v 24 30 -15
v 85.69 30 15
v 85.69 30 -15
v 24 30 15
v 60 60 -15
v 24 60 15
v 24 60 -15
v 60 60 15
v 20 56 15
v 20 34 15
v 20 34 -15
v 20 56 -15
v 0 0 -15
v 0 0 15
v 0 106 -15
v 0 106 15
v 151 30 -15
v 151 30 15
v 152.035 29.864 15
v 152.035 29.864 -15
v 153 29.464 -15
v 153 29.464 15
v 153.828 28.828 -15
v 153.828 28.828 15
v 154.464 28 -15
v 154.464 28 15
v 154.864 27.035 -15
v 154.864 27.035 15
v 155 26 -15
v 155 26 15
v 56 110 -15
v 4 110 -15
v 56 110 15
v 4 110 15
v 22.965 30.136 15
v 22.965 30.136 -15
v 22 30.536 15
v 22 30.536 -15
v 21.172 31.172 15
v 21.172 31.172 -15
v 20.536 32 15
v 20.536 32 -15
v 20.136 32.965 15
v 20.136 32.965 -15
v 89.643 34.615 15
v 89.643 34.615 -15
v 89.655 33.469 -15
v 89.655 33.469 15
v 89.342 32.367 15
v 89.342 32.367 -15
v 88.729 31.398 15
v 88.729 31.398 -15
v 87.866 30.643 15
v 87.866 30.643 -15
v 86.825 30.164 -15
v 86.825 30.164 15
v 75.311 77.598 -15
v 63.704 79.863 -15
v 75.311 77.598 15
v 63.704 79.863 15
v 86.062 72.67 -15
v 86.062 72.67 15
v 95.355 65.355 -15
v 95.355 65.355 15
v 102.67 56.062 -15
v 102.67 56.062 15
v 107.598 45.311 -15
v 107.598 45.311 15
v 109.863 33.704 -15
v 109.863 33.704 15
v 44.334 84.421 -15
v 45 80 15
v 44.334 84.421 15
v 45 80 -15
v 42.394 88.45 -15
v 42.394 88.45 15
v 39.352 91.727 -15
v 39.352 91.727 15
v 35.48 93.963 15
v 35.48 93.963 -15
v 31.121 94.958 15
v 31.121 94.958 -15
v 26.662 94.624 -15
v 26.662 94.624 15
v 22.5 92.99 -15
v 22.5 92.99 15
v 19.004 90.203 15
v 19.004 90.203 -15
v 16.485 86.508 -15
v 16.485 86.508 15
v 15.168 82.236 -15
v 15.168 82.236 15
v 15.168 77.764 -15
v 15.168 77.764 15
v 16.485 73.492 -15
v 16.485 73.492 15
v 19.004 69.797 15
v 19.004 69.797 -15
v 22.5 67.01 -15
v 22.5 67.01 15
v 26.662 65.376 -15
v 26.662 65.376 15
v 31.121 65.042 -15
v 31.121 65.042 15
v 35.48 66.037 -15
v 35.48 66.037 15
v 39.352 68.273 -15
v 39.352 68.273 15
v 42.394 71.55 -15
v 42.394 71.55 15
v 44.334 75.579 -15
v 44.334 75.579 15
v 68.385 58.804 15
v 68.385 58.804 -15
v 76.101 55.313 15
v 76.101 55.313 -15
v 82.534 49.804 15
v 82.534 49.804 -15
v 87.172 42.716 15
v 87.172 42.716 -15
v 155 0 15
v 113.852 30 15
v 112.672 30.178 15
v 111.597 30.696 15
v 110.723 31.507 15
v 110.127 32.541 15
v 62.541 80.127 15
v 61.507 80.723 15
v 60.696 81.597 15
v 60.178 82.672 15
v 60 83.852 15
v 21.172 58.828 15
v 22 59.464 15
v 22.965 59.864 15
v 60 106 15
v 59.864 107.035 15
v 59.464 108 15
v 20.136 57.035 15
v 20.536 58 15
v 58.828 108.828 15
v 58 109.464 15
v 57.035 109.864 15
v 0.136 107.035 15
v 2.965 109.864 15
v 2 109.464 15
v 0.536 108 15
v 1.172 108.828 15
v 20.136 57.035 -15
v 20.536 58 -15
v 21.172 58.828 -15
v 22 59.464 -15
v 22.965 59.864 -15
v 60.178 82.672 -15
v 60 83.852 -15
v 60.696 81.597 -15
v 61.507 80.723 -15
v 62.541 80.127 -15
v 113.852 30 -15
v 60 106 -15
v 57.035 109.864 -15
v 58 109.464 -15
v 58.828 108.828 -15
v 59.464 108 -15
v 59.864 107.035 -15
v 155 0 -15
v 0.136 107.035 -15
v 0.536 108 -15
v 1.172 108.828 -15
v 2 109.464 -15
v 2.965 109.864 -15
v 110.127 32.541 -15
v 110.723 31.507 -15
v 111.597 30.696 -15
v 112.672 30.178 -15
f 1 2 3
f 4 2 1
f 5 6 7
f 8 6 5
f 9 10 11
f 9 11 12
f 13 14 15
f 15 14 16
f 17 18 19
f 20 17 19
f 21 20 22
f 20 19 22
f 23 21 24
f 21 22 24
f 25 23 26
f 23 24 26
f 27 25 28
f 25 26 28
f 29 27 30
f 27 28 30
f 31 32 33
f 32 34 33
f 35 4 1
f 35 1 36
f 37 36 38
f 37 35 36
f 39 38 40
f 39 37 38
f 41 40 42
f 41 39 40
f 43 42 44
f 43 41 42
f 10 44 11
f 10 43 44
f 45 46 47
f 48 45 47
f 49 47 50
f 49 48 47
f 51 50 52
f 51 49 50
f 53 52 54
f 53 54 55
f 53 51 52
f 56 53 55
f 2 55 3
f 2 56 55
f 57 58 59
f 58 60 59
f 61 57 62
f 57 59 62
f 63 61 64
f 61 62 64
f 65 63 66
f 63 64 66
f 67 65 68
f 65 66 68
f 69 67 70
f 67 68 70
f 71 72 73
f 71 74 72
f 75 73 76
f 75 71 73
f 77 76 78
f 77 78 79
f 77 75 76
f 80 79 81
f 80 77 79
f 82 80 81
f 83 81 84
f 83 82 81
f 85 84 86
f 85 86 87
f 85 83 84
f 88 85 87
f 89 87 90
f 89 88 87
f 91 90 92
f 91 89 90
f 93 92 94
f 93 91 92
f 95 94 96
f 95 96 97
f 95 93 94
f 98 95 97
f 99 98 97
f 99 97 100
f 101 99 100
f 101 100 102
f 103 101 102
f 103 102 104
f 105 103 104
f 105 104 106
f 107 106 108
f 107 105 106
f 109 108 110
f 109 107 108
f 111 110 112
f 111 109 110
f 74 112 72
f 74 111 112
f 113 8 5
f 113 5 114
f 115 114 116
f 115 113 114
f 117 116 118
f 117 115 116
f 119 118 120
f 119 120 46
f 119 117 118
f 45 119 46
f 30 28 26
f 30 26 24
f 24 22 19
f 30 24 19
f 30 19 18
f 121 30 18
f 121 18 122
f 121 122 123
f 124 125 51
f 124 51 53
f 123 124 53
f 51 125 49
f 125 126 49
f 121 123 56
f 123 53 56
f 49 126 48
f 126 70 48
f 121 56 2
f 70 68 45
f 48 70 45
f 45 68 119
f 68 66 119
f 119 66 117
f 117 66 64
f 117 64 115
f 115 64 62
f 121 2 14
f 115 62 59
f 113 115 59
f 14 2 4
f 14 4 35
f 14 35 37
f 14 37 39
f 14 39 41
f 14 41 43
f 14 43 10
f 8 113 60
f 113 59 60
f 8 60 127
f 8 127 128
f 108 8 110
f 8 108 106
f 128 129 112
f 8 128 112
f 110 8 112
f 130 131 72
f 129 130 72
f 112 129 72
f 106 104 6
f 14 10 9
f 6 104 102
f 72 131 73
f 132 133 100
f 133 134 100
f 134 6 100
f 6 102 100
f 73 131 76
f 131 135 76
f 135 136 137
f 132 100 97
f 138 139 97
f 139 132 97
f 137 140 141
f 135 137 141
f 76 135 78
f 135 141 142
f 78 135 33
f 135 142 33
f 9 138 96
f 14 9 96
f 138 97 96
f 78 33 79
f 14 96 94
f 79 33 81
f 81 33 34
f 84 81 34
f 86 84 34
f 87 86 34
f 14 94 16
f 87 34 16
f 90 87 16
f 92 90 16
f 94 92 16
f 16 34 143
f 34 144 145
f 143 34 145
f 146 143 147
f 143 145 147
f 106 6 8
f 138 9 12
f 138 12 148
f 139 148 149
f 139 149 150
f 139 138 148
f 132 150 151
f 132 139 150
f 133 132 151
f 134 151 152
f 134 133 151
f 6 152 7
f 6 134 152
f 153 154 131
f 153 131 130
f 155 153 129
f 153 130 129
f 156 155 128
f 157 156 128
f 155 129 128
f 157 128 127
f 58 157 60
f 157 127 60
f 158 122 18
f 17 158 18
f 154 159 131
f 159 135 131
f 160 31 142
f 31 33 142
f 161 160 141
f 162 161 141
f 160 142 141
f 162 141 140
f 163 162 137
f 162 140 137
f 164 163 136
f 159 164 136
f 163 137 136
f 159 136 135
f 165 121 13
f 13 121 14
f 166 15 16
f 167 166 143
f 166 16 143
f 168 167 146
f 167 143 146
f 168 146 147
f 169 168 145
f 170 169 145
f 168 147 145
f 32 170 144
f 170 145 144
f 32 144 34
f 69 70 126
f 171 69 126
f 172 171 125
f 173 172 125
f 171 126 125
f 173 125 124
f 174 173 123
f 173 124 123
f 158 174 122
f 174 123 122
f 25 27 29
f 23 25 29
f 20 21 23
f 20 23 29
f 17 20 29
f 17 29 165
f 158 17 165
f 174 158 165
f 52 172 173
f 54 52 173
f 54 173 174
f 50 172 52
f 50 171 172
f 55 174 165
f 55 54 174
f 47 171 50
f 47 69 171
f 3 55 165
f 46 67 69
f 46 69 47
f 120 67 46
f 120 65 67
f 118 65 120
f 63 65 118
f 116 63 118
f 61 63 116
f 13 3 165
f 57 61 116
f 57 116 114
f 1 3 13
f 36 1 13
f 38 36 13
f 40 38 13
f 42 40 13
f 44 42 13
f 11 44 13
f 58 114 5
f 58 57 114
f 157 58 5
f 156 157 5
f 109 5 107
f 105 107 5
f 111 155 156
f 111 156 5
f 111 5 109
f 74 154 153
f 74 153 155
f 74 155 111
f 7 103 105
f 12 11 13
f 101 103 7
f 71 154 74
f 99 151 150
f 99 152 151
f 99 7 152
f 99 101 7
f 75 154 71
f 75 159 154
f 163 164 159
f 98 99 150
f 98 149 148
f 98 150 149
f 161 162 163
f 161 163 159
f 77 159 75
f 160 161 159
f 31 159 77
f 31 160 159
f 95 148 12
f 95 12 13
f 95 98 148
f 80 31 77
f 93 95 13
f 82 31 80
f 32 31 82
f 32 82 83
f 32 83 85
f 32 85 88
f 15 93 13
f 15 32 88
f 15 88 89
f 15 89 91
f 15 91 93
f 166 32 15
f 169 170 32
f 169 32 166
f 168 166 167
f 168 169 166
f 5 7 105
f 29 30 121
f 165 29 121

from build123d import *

# Parameters (mm, degrees)
SKETCH1_R           = 15
BOSS_EXTRUDE1_DEPTH = 15


with BuildPart() as part:
    # Sketch1 → Boss-Extrude1 (new, symmetric)
    with BuildSketch(Plane.XY):
        with BuildLine():
            Line((0, 0), (0, 106))
            ThreePointArc((0, 106), (1.171572875, 108.828427125), (4, 110))
            Line((4, 110), (56, 110))
            ThreePointArc((56, 110), (58.828427125, 108.828427125), (60, 106))
            Line((60, 106), (60, 83.851648071))
            ThreePointArc((60, 83.851648071), (61.068687565, 81.129992802), (63.703703704, 79.862637103))
            ThreePointArc((63.703703704, 79.862637103), (95.355339059, 65.355339059), (109.862637103, 33.703703704))
            ThreePointArc((109.862637103, 33.703703704), (111.129992802, 31.068687565), (113.851648071, 30))
            Line((113.851648071, 30), (151, 30))
            ThreePointArc((151, 30), (153.828427125, 28.828427125), (155, 26))
            Line((155, 26), (155, 0))
            Line((155, 0), (0, 0))
        make_face()
        with Locations((30, 80)):
            Circle(SKETCH1_R, mode=Mode.SUBTRACT)
        with BuildLine():
            Line((85.690465157, 30), (24, 30))
            ThreePointArc((24, 30), (21.171572875, 31.171572875), (20, 34))
            Line((20, 34), (20, 56))
            ThreePointArc((20, 56), (21.171572875, 58.828427125), (24, 60))
            Line((24, 60), (60, 60))
            ThreePointArc((60, 60), (79.513309068, 52.786635759), (89.642844412, 34.615384615))
            ThreePointArc((89.642844412, 34.615384615), (88.728683259, 31.398225458), (85.690465157, 30))
        make_face(mode=Mode.SUBTRACT)
    extrude(amount=BOSS_EXTRUDE1_DEPTH, both=True)


solid = part.part
